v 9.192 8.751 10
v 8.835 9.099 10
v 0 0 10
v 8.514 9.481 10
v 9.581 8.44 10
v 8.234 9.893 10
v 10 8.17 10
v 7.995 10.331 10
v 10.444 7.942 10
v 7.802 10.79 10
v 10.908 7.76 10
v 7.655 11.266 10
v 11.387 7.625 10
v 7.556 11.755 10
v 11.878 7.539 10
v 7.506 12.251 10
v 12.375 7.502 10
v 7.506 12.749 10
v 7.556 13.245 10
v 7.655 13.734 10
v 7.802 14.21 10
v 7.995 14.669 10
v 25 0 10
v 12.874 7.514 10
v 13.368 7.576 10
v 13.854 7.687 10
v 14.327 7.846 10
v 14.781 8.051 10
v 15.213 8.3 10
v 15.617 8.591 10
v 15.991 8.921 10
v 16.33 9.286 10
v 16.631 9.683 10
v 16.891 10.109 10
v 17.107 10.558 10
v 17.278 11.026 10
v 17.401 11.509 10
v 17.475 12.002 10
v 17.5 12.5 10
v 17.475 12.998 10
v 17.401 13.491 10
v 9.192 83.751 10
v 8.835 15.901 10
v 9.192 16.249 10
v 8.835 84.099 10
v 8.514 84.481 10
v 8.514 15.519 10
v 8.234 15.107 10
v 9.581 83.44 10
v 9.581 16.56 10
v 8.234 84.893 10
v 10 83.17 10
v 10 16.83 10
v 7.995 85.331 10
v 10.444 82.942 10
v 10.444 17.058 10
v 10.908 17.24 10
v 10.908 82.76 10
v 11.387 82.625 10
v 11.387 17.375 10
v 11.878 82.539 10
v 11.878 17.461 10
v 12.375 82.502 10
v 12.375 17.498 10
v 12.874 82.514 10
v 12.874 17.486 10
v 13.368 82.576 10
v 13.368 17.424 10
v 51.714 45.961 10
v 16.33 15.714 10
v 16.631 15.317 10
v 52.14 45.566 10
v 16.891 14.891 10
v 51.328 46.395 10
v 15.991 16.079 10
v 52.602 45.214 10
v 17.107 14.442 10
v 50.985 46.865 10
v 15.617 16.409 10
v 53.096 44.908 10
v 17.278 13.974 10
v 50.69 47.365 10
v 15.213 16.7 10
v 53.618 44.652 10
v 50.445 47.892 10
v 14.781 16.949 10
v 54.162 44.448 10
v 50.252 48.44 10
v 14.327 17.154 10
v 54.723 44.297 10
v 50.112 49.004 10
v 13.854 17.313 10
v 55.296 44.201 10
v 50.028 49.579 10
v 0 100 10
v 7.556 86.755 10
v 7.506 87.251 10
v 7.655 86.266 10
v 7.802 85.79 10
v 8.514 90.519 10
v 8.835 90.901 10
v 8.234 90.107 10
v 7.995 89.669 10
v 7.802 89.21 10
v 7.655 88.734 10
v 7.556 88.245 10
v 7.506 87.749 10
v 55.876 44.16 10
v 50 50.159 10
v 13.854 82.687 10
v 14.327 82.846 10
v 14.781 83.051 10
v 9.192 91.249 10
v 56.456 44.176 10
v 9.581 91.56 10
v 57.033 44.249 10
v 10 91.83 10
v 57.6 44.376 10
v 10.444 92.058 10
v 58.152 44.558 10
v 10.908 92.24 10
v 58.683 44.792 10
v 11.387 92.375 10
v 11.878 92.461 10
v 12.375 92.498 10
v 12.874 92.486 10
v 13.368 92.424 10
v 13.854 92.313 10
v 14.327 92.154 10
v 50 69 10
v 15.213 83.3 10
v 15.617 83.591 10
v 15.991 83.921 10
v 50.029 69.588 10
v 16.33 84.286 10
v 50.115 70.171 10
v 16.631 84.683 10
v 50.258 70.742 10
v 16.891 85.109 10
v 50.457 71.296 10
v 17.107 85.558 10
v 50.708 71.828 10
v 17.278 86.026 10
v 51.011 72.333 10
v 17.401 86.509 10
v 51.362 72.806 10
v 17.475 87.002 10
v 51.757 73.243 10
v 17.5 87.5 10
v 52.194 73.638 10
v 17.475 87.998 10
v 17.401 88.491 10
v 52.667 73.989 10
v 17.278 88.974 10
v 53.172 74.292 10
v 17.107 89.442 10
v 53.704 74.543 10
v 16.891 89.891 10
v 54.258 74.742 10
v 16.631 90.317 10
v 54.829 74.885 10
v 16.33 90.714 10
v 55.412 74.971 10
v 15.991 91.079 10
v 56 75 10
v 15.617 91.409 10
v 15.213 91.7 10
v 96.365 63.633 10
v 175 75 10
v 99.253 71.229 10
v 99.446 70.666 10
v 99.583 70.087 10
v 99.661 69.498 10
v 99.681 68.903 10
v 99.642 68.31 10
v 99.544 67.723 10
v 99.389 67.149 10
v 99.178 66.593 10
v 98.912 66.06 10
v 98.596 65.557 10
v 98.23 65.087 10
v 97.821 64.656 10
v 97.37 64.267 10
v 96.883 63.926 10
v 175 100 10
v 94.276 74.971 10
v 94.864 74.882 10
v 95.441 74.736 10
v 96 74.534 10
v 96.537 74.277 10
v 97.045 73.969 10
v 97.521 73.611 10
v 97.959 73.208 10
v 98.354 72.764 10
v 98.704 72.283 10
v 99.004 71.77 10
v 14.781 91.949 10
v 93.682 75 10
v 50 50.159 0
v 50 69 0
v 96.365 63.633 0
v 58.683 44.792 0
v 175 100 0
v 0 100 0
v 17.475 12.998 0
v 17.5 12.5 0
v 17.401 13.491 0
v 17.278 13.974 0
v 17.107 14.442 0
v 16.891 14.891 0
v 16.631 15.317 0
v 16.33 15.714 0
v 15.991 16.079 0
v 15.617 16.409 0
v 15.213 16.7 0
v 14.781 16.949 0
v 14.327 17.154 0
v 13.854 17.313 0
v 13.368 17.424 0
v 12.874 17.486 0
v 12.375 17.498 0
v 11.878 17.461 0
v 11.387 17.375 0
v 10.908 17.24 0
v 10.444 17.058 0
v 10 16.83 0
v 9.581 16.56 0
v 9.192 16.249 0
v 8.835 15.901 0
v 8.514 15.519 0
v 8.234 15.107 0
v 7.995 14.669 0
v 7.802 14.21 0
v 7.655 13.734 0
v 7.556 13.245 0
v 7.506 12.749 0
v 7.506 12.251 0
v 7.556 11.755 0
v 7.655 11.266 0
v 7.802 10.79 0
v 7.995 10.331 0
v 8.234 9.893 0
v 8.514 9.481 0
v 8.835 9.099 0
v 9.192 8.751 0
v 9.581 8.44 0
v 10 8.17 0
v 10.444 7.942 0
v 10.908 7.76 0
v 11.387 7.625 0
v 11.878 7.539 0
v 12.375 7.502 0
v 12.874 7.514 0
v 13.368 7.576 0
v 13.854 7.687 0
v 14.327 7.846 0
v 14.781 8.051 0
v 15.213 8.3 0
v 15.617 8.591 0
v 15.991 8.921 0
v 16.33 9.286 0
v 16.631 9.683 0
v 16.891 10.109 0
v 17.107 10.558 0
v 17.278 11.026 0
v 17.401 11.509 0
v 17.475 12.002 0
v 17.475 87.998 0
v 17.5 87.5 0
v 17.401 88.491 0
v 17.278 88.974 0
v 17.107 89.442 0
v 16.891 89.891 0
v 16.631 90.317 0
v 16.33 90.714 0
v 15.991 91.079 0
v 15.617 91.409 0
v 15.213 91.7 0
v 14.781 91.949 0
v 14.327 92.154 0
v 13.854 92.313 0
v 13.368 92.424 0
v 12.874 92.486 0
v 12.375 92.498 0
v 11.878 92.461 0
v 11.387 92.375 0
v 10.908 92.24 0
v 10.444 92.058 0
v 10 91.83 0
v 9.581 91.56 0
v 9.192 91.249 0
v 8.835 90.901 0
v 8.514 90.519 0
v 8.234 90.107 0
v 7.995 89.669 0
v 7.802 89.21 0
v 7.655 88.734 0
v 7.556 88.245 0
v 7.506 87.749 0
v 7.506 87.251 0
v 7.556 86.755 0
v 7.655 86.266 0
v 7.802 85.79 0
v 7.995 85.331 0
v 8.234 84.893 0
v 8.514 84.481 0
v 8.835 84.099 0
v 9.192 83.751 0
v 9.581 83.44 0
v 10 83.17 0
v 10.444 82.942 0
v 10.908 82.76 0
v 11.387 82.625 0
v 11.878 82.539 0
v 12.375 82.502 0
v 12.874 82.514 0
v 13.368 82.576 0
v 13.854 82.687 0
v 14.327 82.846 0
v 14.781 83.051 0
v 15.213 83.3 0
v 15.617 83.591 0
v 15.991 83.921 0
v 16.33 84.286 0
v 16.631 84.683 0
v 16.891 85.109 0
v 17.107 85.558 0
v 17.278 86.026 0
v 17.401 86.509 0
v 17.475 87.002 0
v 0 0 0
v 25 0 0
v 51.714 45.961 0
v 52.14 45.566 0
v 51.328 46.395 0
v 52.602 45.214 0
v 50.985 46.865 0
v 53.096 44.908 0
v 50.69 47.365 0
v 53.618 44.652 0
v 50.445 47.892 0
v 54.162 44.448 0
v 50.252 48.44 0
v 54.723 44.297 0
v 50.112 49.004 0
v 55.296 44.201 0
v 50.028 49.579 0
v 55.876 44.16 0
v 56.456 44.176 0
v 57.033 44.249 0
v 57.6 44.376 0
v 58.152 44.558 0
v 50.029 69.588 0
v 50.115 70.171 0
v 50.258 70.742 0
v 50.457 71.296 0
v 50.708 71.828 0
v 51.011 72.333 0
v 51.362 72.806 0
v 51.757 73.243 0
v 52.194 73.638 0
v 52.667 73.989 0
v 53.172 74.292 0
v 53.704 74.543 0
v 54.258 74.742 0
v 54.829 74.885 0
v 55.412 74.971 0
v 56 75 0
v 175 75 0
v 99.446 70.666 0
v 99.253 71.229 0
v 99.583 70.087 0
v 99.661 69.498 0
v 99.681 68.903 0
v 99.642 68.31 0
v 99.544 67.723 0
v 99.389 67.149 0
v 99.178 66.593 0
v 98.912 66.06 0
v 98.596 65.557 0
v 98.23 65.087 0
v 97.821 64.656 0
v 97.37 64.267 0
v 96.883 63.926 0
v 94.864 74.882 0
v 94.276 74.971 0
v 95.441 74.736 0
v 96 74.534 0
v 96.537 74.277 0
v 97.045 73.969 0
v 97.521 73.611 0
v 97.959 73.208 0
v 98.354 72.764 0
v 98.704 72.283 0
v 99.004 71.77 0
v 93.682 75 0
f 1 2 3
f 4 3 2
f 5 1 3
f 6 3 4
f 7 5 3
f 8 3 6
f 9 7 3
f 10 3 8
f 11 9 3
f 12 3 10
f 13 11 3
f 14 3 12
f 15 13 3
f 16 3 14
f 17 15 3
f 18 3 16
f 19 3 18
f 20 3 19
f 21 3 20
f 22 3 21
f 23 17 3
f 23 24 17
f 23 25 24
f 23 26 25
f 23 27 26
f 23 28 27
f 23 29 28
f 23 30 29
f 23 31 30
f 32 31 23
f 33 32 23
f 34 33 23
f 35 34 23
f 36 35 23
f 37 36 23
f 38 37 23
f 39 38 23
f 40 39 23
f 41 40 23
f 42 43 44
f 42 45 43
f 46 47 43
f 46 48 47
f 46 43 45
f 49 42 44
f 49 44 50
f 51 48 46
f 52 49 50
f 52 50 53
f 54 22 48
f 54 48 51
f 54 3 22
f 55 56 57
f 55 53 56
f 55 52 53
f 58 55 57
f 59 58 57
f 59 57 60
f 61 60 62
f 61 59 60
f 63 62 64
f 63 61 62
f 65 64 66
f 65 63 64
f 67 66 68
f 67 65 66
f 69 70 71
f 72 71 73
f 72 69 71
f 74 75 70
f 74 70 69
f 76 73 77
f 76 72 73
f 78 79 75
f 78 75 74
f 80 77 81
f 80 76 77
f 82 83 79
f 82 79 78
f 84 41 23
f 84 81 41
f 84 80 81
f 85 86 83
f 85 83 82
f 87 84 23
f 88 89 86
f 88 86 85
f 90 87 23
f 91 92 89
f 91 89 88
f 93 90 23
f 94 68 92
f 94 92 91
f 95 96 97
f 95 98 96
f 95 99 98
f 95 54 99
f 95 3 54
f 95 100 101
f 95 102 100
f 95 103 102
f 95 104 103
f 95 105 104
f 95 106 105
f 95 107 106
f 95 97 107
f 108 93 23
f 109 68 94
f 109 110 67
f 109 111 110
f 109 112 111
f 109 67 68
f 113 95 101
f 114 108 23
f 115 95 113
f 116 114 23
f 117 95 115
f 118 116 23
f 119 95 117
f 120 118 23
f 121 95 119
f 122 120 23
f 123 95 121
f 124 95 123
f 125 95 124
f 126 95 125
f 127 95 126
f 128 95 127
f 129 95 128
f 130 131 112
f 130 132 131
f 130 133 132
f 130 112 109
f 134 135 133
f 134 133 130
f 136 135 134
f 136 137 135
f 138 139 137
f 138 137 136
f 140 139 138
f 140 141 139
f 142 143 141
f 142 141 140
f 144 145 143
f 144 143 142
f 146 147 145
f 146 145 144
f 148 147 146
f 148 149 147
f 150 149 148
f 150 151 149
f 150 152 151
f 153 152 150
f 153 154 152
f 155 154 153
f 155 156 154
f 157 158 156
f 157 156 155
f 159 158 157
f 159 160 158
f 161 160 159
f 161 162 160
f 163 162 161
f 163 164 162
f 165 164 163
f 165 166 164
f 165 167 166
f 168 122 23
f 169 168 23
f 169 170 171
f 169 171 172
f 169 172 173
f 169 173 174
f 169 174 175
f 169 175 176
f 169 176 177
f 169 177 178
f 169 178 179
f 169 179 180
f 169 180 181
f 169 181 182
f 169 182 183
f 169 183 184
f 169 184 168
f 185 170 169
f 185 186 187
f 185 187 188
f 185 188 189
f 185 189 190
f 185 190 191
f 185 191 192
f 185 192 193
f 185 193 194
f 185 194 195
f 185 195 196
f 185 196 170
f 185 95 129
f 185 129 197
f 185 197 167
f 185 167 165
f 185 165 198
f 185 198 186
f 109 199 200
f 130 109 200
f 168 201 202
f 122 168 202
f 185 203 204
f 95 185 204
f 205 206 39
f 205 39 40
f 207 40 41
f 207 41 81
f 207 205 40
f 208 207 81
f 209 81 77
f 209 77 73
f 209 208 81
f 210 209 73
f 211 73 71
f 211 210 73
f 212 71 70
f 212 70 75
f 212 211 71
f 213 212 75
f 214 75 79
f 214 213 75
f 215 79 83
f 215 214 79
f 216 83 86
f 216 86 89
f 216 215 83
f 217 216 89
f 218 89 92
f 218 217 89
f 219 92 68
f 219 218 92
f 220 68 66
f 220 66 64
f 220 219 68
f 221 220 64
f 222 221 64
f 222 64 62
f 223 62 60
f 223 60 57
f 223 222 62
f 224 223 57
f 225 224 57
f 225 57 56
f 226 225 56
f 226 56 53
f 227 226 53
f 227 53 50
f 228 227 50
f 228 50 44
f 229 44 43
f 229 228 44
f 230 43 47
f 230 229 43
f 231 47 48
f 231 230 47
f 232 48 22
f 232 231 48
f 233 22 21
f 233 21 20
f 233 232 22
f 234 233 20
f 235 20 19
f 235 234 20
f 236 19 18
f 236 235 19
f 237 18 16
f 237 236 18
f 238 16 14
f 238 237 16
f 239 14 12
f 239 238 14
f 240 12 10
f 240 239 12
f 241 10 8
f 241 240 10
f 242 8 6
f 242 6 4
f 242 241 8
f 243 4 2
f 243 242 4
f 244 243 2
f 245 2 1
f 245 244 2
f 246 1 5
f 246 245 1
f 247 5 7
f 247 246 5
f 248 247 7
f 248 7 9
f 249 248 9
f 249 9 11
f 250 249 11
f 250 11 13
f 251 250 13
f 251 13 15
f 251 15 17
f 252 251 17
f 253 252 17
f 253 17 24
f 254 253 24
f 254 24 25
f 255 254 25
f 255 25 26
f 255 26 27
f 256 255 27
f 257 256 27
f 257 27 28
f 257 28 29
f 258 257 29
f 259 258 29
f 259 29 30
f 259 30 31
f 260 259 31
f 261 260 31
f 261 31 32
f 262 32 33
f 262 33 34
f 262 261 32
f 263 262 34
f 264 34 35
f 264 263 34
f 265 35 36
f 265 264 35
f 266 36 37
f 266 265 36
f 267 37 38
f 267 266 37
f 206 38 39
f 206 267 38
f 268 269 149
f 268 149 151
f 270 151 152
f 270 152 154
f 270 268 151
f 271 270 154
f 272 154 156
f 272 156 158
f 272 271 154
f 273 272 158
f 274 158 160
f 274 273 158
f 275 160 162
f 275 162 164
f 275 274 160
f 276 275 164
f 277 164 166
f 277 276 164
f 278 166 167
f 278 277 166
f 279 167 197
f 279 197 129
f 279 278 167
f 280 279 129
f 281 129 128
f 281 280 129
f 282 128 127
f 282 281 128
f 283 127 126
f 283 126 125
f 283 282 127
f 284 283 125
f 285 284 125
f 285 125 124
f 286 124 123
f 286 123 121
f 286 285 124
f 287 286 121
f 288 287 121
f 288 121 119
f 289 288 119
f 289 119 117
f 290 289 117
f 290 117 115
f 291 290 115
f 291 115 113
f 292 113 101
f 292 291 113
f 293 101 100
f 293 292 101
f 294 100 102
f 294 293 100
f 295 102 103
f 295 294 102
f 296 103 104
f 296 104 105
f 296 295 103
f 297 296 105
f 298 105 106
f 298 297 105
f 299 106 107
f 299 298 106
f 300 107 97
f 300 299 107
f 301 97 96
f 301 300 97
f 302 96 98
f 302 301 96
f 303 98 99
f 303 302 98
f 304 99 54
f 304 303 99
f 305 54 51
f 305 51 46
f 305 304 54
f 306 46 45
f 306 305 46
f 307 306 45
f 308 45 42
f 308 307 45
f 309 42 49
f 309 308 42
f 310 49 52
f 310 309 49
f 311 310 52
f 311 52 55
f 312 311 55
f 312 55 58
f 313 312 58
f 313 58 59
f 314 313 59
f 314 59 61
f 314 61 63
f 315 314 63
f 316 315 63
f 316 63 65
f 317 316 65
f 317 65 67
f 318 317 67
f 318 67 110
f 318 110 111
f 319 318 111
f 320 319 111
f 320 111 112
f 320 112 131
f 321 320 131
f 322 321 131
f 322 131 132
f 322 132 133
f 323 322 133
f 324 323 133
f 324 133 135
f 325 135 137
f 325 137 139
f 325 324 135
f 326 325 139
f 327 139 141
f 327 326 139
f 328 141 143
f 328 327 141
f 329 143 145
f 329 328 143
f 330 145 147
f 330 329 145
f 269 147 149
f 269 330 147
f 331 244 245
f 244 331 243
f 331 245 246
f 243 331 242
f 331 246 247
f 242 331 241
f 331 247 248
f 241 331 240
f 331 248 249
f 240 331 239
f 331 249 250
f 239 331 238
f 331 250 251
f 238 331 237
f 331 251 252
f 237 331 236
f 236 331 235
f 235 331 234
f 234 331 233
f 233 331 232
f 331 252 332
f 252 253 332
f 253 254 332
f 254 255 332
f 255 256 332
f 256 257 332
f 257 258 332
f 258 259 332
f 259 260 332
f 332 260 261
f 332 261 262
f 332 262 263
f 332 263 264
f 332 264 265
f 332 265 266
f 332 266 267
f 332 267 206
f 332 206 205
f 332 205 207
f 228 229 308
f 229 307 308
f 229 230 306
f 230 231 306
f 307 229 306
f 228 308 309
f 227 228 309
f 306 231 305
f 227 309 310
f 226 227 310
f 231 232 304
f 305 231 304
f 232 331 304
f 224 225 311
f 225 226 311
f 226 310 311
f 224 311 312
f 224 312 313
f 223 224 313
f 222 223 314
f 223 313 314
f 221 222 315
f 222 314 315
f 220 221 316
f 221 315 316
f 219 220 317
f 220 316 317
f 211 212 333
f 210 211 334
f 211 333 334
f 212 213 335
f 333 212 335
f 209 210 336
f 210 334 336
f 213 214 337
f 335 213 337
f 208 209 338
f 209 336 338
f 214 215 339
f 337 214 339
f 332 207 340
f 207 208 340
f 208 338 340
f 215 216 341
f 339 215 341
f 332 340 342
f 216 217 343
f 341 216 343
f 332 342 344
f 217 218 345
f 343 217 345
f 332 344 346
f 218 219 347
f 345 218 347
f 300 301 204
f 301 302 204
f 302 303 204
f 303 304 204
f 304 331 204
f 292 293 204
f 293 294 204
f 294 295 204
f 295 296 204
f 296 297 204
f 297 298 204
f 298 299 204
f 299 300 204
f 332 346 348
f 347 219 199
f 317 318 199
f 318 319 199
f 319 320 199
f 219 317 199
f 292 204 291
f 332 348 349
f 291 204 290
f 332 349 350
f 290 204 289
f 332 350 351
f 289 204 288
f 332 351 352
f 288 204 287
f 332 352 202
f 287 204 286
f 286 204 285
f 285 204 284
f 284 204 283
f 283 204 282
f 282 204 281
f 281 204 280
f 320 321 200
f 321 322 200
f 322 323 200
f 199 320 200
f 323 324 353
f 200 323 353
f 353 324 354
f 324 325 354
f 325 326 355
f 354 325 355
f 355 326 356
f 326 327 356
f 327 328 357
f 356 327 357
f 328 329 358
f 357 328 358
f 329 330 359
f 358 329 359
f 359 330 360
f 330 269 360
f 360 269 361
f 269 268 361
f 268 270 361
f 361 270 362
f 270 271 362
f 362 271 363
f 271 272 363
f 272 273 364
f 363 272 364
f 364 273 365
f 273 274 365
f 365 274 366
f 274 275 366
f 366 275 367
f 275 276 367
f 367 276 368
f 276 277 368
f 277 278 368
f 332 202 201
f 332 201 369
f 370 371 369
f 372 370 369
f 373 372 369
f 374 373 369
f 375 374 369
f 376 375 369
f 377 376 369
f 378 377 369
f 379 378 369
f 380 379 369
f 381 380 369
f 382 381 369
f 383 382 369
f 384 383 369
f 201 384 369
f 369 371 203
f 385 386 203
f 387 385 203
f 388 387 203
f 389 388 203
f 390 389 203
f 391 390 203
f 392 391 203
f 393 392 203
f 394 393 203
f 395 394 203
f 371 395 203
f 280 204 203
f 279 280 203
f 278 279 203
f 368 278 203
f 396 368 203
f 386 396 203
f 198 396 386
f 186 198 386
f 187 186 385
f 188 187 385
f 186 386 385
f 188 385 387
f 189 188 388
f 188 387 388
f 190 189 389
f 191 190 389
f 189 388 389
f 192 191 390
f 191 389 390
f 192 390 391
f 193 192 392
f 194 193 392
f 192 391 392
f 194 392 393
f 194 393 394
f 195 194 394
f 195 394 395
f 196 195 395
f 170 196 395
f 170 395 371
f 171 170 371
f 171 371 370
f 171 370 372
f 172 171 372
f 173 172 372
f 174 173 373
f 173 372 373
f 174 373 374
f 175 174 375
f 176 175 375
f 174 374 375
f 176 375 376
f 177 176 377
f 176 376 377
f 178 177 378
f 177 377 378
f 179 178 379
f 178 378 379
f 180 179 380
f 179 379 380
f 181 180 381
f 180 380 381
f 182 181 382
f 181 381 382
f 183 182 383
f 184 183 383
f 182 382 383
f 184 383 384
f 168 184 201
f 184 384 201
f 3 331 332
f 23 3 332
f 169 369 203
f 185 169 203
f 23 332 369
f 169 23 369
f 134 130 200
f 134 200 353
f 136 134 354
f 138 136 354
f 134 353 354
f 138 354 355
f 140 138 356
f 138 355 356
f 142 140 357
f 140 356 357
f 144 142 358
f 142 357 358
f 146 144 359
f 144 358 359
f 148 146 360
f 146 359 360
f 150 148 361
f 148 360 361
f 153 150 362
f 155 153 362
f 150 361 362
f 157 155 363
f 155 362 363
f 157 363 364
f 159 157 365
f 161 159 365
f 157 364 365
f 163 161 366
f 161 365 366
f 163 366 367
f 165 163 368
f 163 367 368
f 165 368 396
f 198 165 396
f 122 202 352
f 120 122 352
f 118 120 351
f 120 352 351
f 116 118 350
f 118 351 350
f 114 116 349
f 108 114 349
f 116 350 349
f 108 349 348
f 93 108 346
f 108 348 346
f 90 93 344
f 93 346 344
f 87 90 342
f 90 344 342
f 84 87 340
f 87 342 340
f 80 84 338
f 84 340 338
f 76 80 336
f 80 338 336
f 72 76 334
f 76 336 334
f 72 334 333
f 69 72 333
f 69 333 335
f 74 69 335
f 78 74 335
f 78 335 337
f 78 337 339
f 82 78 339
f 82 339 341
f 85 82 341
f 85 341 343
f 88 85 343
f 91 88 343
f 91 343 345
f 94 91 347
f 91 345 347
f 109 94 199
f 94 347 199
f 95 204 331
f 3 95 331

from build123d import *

# Parameters (mm, degrees)
SKETCH1_R          = 5
BASE_EXTRUDE_DEPTH = 10


with BuildPart() as part:
    # Sketch1 → Base-Extrude (new body)
    with BuildSketch(Plane.XY):
        Polygon((0, 0), (25, 0), (175, 75), (175, 100), (0, 100), align=None)
        with Locations((12.5, 12.5)):
            Circle(SKETCH1_R, mode=Mode.SUBTRACT)
        with Locations((12.5, 87.5)):
            Circle(SKETCH1_R, mode=Mode.SUBTRACT)
        with BuildLine():
            Line((50, 50.159053651), (50, 69))
            ThreePointArc((50, 69), (51.757359313, 73.242640687), (56, 75))
            Line((56, 75), (93.681892698, 75))
            ThreePointArc((93.681892698, 75), (99.521386634, 70.378517523), (96.365174271, 63.633436854))
            Line((96.365174271, 63.633436854), (58.683281573, 44.792490505))
            ThreePointArc((58.683281573, 44.792490505), (52.845613327, 45.055148801), (50, 50.159053651))
        make_face(mode=Mode.SUBTRACT)
    extrude(amount=BASE_EXTRUDE_DEPTH)


solid = part.part
